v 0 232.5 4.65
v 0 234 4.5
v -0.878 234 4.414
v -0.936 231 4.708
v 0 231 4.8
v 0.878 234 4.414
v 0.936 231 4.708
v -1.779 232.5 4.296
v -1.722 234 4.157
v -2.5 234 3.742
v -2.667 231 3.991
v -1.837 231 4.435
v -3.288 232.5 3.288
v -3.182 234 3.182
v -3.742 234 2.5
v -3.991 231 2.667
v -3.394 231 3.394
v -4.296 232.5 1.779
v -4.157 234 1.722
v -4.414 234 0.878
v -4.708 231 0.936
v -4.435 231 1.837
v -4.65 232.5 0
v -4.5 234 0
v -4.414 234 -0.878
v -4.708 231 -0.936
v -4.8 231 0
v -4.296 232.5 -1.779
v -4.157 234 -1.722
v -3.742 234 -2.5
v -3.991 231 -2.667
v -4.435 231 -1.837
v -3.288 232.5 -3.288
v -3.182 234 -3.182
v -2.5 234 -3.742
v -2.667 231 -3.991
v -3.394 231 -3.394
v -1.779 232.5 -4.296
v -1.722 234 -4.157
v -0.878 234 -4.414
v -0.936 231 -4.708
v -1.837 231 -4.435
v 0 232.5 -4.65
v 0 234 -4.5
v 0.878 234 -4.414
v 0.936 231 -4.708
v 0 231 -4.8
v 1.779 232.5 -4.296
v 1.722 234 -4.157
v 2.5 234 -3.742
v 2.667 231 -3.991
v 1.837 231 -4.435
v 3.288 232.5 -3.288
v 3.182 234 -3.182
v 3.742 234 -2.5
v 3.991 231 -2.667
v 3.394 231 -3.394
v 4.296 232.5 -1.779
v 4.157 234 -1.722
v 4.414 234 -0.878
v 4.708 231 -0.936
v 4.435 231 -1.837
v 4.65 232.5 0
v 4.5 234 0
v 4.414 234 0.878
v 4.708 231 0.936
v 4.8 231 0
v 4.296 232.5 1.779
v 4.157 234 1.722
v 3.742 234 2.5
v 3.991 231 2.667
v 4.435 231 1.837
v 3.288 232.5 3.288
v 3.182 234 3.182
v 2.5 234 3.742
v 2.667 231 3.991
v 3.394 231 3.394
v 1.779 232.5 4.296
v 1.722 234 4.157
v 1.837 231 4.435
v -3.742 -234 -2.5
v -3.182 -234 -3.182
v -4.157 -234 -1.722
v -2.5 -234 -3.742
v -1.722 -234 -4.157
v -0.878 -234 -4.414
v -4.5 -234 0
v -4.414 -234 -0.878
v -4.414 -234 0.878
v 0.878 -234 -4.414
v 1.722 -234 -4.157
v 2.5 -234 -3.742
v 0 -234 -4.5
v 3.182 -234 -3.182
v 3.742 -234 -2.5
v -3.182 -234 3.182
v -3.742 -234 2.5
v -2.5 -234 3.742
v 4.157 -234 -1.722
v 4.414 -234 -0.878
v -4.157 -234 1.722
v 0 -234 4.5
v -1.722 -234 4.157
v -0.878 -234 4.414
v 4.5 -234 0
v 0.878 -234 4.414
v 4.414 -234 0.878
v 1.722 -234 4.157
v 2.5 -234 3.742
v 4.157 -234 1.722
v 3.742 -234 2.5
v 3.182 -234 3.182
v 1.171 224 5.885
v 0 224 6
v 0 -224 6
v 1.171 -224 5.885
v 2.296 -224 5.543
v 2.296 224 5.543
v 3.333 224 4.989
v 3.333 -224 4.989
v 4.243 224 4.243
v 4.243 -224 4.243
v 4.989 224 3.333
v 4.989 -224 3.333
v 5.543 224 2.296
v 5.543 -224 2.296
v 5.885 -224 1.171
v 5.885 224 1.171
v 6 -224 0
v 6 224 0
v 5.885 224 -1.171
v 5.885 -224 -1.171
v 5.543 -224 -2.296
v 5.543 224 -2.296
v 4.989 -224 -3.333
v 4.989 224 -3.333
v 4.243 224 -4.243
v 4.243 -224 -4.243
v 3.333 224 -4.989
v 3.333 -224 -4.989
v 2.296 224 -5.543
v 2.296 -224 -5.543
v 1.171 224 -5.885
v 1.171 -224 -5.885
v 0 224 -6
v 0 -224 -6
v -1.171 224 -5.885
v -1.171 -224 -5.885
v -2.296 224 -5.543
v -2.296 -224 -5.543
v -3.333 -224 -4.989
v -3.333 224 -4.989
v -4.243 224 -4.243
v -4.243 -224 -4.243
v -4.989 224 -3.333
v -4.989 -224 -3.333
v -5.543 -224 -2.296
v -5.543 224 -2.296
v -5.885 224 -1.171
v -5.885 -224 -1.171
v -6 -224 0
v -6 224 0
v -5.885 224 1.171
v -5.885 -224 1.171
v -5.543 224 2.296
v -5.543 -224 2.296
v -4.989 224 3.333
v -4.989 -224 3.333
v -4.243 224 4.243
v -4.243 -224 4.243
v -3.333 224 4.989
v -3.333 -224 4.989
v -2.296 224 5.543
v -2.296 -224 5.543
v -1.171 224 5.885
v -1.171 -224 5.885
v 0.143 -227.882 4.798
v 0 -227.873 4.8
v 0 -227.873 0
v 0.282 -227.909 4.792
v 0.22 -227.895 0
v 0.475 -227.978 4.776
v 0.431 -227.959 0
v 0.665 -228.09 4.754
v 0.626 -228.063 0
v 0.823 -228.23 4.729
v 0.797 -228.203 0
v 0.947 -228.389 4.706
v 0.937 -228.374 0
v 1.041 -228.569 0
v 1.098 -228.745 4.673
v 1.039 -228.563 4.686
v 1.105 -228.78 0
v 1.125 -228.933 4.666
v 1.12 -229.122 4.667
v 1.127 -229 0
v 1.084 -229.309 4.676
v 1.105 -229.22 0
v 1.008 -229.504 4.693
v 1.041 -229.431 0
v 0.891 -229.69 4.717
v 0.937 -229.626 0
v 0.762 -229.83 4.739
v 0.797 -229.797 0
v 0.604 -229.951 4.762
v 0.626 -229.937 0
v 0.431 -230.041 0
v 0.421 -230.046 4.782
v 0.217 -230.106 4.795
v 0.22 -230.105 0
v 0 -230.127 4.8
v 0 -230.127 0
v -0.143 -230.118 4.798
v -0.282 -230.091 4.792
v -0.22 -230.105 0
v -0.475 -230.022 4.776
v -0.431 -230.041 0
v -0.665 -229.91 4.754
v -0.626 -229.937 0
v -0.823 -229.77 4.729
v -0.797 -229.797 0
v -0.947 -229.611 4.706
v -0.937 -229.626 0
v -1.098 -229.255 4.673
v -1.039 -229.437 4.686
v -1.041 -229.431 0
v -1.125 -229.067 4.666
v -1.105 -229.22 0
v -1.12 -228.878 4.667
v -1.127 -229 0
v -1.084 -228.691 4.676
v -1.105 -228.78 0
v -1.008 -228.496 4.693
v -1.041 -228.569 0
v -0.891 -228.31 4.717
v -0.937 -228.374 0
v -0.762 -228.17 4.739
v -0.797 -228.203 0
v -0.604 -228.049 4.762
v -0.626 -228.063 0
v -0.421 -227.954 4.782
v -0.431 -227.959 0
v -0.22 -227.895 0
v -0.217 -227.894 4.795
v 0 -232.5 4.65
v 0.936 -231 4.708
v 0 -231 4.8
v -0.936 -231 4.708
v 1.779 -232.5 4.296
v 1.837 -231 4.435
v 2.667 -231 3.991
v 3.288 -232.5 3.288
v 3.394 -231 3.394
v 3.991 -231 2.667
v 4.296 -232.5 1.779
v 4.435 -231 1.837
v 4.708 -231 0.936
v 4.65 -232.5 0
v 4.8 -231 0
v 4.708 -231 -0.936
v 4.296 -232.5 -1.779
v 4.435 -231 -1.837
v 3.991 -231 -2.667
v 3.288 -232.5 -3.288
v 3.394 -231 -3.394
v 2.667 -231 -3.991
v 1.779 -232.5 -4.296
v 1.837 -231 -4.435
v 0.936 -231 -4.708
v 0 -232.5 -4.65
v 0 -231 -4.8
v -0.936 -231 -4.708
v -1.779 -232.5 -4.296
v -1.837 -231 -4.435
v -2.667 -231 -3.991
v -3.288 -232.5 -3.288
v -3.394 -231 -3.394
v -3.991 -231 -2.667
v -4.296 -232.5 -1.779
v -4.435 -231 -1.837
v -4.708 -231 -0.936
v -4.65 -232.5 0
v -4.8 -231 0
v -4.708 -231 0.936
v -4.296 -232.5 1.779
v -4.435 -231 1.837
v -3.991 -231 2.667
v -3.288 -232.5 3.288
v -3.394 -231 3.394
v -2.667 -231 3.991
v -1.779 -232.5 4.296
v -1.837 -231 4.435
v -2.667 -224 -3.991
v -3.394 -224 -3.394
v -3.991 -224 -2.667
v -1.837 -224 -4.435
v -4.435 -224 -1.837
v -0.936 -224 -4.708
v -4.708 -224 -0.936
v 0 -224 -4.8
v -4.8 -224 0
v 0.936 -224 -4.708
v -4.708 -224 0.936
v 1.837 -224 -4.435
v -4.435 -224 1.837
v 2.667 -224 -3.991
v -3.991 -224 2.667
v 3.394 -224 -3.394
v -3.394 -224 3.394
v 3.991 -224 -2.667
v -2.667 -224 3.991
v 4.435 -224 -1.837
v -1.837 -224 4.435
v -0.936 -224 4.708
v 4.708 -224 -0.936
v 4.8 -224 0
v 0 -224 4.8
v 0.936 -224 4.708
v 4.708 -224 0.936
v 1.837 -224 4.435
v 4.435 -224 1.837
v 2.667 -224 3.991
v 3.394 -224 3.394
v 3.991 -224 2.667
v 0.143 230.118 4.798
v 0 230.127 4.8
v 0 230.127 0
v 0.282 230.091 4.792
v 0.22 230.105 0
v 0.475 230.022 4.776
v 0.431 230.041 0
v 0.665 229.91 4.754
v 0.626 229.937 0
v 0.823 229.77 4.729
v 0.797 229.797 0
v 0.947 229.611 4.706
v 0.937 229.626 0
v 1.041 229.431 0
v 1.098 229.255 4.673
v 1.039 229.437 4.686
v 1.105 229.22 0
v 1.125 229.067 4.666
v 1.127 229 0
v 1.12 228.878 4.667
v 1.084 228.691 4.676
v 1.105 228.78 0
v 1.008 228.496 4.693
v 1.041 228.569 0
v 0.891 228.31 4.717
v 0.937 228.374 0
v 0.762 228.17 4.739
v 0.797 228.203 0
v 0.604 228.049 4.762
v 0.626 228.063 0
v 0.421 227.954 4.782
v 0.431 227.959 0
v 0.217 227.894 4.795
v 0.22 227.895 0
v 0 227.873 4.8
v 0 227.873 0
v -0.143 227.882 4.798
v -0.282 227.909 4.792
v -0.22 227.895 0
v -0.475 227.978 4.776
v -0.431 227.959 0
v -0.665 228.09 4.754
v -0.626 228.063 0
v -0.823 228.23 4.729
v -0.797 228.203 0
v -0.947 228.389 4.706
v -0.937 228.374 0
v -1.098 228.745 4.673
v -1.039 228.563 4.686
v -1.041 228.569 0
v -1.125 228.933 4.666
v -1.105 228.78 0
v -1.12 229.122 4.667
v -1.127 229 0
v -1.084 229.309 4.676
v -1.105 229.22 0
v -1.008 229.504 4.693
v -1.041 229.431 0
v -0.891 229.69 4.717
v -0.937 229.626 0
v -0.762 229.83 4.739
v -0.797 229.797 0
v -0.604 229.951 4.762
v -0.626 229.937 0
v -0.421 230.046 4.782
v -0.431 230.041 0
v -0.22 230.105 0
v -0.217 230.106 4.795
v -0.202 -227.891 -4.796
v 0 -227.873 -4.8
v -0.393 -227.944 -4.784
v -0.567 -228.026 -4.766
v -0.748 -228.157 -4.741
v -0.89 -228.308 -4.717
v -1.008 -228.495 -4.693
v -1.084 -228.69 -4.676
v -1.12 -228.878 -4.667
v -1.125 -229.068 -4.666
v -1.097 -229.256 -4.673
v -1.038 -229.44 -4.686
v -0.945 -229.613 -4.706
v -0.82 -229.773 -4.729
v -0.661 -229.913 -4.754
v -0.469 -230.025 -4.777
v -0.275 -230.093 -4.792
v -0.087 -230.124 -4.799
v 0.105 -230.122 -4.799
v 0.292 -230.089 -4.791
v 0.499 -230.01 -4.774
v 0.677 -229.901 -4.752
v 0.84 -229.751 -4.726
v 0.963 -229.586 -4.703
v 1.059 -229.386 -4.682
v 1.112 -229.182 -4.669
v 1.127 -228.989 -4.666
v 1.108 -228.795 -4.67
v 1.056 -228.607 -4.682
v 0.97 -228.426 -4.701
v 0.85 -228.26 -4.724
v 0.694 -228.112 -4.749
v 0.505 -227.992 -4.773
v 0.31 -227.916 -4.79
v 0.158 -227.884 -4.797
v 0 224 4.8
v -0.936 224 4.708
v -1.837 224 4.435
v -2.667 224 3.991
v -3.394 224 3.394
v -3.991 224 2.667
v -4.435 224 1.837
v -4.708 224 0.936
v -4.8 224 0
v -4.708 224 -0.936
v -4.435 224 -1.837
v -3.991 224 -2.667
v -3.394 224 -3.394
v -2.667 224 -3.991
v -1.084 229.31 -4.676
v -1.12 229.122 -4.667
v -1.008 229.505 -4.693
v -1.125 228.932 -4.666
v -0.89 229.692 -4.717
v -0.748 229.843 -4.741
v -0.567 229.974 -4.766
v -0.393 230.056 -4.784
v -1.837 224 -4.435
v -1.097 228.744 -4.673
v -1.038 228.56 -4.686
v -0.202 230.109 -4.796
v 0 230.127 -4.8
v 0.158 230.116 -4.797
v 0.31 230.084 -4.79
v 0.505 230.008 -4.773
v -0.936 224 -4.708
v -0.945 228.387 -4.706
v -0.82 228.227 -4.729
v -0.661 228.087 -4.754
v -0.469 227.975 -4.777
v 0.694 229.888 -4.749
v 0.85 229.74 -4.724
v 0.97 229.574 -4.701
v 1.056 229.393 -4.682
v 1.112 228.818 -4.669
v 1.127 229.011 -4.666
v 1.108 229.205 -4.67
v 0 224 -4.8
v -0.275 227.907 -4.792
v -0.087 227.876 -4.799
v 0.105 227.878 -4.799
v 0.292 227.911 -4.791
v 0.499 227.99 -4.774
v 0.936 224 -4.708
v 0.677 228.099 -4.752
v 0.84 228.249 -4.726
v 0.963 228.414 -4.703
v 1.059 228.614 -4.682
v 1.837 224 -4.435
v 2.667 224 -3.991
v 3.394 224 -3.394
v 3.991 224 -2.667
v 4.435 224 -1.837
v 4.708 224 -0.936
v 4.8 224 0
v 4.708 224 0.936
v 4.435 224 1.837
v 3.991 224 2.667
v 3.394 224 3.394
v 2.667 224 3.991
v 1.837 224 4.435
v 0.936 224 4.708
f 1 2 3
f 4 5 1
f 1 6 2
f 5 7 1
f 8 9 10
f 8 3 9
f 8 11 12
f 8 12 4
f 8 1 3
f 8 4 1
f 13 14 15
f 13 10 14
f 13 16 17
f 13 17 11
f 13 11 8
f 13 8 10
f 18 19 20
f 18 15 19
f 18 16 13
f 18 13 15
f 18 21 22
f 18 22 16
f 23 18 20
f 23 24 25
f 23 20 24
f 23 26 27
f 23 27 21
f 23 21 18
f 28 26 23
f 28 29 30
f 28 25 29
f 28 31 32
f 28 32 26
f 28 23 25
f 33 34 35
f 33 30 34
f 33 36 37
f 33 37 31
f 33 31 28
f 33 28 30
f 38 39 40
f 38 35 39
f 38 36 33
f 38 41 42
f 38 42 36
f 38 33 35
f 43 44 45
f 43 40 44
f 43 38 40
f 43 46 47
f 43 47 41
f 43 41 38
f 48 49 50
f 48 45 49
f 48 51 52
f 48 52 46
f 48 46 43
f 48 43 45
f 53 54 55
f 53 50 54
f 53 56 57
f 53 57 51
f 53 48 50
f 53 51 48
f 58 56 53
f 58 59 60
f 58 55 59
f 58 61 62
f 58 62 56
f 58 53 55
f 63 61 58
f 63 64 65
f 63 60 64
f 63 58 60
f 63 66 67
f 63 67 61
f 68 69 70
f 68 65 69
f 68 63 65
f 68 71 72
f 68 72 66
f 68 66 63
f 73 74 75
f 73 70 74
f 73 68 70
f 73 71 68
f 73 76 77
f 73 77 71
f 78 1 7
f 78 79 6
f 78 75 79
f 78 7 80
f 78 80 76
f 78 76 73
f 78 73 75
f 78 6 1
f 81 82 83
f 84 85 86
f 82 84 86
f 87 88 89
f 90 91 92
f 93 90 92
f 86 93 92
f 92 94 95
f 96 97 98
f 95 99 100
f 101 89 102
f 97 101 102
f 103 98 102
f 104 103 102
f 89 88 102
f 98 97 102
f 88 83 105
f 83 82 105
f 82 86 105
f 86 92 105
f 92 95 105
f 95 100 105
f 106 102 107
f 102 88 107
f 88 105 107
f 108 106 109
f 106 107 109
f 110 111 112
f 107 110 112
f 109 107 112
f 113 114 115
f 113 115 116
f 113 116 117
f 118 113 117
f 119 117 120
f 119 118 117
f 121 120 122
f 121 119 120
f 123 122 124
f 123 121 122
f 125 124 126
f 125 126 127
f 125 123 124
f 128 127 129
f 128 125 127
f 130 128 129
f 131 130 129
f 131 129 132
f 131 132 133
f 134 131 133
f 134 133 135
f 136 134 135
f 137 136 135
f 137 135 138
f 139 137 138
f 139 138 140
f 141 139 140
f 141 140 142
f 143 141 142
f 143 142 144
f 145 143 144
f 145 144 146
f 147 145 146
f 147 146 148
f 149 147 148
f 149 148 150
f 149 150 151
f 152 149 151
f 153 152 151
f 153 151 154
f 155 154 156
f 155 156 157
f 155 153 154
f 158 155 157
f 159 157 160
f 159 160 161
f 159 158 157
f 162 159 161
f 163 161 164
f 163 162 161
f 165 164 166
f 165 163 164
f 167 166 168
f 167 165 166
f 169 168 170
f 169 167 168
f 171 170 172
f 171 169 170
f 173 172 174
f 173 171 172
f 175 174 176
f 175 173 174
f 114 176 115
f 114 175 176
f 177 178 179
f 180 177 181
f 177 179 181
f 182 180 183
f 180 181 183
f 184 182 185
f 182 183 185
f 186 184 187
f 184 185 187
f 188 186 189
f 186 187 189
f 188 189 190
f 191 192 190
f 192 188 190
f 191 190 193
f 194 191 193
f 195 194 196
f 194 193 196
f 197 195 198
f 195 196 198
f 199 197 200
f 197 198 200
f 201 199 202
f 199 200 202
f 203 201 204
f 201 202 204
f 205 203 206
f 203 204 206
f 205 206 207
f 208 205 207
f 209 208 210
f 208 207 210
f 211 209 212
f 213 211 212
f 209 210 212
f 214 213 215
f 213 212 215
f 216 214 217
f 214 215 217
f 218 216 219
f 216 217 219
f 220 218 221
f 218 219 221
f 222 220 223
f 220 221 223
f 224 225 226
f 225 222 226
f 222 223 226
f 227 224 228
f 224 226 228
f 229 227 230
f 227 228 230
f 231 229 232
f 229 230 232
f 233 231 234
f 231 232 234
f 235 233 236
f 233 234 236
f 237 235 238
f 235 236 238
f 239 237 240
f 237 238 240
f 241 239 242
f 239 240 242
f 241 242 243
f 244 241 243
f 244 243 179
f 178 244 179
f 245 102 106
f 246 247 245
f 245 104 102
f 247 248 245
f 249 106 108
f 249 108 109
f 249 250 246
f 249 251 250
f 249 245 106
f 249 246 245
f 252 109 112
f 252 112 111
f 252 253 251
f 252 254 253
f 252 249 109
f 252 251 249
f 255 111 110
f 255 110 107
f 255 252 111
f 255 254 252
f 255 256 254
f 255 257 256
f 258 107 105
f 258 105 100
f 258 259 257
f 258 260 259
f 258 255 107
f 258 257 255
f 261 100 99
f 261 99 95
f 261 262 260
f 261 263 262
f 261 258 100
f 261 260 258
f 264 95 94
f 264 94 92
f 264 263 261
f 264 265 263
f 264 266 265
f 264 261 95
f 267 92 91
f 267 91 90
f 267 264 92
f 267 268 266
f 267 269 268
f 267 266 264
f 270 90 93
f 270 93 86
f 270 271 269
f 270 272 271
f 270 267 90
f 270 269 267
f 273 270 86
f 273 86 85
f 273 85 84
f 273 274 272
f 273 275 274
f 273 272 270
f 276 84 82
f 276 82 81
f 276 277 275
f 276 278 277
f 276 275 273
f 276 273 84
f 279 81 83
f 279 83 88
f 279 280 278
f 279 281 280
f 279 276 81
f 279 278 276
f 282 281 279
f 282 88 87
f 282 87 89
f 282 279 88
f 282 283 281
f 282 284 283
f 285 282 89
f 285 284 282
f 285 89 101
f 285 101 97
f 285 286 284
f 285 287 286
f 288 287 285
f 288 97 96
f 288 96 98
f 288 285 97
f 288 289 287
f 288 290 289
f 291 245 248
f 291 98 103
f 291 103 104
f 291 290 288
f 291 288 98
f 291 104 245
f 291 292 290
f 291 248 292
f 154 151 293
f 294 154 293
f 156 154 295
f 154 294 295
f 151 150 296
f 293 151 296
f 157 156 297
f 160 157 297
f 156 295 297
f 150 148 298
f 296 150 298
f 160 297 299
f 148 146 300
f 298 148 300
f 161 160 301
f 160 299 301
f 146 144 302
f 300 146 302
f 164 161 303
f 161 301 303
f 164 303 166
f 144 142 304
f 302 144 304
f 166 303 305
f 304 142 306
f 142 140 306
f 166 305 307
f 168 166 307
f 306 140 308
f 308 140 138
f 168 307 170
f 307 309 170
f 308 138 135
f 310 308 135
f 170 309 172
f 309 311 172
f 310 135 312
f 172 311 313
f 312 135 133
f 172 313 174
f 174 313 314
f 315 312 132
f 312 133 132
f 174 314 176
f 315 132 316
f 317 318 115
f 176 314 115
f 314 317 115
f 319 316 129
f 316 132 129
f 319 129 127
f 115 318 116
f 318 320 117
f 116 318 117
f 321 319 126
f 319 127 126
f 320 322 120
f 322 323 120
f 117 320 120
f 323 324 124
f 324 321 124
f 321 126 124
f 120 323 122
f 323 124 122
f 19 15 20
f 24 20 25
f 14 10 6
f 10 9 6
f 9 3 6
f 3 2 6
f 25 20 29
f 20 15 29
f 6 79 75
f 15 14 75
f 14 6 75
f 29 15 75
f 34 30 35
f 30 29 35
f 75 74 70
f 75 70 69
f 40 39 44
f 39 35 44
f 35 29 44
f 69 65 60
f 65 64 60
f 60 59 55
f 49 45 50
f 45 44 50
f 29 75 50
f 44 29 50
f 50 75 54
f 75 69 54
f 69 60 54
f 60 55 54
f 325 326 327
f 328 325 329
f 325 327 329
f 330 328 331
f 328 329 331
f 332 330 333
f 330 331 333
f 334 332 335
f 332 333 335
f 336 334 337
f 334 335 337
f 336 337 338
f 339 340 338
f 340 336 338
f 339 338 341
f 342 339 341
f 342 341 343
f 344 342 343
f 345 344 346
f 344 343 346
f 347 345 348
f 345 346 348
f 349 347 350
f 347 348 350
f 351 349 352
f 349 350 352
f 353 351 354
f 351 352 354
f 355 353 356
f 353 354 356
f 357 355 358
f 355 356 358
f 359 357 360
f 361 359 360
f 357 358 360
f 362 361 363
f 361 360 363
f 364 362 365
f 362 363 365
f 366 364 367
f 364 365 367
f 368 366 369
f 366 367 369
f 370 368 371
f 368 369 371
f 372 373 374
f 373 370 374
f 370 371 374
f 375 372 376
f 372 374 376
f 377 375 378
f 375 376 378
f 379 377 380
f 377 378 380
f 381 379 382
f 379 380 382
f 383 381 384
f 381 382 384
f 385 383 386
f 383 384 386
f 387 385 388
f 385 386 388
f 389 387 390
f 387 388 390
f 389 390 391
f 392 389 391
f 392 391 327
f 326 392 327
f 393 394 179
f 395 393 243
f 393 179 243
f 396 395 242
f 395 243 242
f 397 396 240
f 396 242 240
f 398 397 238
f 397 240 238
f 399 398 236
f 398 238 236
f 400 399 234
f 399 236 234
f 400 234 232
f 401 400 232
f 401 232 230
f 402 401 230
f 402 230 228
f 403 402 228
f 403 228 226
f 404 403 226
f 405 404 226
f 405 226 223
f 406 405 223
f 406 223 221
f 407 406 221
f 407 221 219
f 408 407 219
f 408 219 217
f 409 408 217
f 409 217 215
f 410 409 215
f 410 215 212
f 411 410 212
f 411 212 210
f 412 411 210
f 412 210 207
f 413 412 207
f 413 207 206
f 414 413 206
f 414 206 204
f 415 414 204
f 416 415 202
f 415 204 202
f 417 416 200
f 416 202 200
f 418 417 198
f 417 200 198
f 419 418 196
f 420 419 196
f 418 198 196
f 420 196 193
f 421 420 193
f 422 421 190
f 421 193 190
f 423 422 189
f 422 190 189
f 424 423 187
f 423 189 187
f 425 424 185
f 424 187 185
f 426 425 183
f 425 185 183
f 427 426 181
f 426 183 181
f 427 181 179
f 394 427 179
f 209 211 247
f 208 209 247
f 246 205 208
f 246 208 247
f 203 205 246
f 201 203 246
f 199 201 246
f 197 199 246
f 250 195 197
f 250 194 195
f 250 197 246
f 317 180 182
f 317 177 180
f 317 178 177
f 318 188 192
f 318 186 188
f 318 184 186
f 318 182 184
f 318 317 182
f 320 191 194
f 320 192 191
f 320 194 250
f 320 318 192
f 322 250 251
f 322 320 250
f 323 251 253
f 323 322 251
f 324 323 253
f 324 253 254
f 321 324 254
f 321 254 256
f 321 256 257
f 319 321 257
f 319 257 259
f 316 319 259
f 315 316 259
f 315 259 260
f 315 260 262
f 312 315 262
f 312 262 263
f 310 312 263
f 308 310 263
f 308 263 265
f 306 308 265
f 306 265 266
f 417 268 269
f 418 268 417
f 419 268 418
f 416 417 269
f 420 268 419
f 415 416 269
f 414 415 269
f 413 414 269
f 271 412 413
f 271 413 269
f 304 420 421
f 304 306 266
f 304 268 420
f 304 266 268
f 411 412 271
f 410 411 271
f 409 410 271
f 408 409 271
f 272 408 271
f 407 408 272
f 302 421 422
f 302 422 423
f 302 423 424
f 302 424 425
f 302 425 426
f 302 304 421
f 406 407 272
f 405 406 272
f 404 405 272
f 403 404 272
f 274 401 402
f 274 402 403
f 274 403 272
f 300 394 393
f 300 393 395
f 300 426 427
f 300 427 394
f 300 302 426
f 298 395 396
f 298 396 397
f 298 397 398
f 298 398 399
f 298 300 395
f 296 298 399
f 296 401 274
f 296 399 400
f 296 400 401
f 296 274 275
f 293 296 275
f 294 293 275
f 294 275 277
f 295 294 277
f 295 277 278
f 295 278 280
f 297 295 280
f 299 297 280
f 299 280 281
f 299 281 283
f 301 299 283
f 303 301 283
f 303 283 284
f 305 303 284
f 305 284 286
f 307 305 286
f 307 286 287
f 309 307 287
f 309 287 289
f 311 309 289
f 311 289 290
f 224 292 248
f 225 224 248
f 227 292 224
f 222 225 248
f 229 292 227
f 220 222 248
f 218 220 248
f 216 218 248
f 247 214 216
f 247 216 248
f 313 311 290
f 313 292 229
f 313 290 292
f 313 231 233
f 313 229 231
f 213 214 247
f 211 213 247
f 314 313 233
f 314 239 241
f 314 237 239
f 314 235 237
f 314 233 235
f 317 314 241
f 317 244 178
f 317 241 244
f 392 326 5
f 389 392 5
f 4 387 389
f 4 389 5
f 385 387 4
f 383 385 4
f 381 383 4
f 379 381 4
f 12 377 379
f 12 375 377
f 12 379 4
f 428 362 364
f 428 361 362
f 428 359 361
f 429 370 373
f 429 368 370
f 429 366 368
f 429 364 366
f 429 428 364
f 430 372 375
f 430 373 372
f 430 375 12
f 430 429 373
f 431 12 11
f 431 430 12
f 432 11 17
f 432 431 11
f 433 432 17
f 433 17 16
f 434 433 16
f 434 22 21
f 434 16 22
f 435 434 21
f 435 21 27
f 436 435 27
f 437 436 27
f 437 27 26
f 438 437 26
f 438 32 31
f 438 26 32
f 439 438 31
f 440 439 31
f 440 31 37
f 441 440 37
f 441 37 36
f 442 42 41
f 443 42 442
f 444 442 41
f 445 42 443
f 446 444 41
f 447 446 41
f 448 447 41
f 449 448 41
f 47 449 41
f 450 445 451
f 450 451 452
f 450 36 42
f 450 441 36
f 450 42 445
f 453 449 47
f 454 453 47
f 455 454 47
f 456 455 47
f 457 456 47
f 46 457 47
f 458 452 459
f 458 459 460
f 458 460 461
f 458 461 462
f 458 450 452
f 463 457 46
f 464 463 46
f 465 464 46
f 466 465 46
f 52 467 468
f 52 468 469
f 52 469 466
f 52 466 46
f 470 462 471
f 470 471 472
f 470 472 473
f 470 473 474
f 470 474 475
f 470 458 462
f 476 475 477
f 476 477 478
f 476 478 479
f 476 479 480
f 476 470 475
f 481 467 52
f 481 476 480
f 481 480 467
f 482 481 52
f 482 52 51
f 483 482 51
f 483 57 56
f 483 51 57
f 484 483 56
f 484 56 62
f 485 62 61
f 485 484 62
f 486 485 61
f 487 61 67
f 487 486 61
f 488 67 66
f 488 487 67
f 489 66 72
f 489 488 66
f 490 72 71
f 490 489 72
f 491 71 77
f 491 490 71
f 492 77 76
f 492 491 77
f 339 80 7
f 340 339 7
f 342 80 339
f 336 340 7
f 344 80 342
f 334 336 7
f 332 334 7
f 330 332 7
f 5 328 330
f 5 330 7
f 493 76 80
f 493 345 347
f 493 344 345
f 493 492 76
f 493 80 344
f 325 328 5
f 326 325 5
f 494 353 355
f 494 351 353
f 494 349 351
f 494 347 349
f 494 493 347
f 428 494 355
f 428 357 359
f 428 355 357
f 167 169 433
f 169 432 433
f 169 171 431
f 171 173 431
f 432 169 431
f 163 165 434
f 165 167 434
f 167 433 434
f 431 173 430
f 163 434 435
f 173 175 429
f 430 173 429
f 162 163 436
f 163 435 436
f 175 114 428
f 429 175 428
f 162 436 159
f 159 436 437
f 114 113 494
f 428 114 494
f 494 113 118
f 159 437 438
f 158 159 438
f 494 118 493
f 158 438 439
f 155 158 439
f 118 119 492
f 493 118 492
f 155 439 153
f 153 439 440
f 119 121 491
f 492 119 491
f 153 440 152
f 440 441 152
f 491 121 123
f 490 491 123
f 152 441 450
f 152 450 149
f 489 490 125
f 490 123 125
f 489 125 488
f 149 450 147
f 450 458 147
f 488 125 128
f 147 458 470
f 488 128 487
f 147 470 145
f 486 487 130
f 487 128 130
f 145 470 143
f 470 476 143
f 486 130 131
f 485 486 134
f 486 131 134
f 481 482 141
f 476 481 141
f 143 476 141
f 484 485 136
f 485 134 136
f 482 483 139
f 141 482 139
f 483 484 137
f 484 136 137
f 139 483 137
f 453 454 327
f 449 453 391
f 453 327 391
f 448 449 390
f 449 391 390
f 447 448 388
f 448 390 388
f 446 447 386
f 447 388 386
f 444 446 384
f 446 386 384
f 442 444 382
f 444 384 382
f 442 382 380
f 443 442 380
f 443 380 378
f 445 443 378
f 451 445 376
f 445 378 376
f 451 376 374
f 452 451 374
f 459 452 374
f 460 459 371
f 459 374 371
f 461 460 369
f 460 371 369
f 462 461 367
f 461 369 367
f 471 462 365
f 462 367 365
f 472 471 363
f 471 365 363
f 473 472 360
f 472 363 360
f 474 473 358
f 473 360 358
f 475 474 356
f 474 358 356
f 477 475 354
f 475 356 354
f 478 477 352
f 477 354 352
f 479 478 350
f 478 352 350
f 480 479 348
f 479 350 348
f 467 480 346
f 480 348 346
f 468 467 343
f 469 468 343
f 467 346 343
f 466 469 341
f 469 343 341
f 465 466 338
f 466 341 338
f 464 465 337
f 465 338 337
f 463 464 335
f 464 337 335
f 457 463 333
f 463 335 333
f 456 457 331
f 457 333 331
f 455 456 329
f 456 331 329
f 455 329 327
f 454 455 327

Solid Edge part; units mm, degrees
sketch "Sketch1" plane through (0, 0, 0) normal (1, 0, 0) x (0, 1, 0)
  line L0 (-234, 0) -> (-234, 4.5)
  line L1 (-234, 4.5) -> (-231, 4.8)
  line L2 (-231, 4.8) -> (-224, 4.8)
  line L3 (-224, 4.8) -> (-224, 6)
  line L4 (-224, 6) -> (0, 6)
  line L5 (0, 6) -> (0, 0)
  dimension "D1" = 4.8
  dimension "D2" = 6
  dimension "D3" = 10
  dimension "D4" = 3
  dimension "D5" = 234
  dimension "D6" = 4.5
revolve "RevolvedProtrusion1" add sketch "Sketch1" angle 360 about axis through (0, -238, 0) along (0, 1, 0)
mirror "Mirror1" about plane through (0, 0, 0) normal (0, -1, 0) of "RevolvedProtrusion1"
hole "Hole1" at (0, -229, 0) direction (0, 0, 1) diameter 2.254 end through all
hole "Hole2" at (0, 229, 0) direction (0, 0, 1) diameter 2.254 end through all
mirror "Mirror2" about plane through (0, 0, 0) normal (0, 0, 1) of "Hole1", "Hole2"
properties part number "19" material "Aluminiumlegierung:3.0205, Al 99.0, EN-AW 1200"
